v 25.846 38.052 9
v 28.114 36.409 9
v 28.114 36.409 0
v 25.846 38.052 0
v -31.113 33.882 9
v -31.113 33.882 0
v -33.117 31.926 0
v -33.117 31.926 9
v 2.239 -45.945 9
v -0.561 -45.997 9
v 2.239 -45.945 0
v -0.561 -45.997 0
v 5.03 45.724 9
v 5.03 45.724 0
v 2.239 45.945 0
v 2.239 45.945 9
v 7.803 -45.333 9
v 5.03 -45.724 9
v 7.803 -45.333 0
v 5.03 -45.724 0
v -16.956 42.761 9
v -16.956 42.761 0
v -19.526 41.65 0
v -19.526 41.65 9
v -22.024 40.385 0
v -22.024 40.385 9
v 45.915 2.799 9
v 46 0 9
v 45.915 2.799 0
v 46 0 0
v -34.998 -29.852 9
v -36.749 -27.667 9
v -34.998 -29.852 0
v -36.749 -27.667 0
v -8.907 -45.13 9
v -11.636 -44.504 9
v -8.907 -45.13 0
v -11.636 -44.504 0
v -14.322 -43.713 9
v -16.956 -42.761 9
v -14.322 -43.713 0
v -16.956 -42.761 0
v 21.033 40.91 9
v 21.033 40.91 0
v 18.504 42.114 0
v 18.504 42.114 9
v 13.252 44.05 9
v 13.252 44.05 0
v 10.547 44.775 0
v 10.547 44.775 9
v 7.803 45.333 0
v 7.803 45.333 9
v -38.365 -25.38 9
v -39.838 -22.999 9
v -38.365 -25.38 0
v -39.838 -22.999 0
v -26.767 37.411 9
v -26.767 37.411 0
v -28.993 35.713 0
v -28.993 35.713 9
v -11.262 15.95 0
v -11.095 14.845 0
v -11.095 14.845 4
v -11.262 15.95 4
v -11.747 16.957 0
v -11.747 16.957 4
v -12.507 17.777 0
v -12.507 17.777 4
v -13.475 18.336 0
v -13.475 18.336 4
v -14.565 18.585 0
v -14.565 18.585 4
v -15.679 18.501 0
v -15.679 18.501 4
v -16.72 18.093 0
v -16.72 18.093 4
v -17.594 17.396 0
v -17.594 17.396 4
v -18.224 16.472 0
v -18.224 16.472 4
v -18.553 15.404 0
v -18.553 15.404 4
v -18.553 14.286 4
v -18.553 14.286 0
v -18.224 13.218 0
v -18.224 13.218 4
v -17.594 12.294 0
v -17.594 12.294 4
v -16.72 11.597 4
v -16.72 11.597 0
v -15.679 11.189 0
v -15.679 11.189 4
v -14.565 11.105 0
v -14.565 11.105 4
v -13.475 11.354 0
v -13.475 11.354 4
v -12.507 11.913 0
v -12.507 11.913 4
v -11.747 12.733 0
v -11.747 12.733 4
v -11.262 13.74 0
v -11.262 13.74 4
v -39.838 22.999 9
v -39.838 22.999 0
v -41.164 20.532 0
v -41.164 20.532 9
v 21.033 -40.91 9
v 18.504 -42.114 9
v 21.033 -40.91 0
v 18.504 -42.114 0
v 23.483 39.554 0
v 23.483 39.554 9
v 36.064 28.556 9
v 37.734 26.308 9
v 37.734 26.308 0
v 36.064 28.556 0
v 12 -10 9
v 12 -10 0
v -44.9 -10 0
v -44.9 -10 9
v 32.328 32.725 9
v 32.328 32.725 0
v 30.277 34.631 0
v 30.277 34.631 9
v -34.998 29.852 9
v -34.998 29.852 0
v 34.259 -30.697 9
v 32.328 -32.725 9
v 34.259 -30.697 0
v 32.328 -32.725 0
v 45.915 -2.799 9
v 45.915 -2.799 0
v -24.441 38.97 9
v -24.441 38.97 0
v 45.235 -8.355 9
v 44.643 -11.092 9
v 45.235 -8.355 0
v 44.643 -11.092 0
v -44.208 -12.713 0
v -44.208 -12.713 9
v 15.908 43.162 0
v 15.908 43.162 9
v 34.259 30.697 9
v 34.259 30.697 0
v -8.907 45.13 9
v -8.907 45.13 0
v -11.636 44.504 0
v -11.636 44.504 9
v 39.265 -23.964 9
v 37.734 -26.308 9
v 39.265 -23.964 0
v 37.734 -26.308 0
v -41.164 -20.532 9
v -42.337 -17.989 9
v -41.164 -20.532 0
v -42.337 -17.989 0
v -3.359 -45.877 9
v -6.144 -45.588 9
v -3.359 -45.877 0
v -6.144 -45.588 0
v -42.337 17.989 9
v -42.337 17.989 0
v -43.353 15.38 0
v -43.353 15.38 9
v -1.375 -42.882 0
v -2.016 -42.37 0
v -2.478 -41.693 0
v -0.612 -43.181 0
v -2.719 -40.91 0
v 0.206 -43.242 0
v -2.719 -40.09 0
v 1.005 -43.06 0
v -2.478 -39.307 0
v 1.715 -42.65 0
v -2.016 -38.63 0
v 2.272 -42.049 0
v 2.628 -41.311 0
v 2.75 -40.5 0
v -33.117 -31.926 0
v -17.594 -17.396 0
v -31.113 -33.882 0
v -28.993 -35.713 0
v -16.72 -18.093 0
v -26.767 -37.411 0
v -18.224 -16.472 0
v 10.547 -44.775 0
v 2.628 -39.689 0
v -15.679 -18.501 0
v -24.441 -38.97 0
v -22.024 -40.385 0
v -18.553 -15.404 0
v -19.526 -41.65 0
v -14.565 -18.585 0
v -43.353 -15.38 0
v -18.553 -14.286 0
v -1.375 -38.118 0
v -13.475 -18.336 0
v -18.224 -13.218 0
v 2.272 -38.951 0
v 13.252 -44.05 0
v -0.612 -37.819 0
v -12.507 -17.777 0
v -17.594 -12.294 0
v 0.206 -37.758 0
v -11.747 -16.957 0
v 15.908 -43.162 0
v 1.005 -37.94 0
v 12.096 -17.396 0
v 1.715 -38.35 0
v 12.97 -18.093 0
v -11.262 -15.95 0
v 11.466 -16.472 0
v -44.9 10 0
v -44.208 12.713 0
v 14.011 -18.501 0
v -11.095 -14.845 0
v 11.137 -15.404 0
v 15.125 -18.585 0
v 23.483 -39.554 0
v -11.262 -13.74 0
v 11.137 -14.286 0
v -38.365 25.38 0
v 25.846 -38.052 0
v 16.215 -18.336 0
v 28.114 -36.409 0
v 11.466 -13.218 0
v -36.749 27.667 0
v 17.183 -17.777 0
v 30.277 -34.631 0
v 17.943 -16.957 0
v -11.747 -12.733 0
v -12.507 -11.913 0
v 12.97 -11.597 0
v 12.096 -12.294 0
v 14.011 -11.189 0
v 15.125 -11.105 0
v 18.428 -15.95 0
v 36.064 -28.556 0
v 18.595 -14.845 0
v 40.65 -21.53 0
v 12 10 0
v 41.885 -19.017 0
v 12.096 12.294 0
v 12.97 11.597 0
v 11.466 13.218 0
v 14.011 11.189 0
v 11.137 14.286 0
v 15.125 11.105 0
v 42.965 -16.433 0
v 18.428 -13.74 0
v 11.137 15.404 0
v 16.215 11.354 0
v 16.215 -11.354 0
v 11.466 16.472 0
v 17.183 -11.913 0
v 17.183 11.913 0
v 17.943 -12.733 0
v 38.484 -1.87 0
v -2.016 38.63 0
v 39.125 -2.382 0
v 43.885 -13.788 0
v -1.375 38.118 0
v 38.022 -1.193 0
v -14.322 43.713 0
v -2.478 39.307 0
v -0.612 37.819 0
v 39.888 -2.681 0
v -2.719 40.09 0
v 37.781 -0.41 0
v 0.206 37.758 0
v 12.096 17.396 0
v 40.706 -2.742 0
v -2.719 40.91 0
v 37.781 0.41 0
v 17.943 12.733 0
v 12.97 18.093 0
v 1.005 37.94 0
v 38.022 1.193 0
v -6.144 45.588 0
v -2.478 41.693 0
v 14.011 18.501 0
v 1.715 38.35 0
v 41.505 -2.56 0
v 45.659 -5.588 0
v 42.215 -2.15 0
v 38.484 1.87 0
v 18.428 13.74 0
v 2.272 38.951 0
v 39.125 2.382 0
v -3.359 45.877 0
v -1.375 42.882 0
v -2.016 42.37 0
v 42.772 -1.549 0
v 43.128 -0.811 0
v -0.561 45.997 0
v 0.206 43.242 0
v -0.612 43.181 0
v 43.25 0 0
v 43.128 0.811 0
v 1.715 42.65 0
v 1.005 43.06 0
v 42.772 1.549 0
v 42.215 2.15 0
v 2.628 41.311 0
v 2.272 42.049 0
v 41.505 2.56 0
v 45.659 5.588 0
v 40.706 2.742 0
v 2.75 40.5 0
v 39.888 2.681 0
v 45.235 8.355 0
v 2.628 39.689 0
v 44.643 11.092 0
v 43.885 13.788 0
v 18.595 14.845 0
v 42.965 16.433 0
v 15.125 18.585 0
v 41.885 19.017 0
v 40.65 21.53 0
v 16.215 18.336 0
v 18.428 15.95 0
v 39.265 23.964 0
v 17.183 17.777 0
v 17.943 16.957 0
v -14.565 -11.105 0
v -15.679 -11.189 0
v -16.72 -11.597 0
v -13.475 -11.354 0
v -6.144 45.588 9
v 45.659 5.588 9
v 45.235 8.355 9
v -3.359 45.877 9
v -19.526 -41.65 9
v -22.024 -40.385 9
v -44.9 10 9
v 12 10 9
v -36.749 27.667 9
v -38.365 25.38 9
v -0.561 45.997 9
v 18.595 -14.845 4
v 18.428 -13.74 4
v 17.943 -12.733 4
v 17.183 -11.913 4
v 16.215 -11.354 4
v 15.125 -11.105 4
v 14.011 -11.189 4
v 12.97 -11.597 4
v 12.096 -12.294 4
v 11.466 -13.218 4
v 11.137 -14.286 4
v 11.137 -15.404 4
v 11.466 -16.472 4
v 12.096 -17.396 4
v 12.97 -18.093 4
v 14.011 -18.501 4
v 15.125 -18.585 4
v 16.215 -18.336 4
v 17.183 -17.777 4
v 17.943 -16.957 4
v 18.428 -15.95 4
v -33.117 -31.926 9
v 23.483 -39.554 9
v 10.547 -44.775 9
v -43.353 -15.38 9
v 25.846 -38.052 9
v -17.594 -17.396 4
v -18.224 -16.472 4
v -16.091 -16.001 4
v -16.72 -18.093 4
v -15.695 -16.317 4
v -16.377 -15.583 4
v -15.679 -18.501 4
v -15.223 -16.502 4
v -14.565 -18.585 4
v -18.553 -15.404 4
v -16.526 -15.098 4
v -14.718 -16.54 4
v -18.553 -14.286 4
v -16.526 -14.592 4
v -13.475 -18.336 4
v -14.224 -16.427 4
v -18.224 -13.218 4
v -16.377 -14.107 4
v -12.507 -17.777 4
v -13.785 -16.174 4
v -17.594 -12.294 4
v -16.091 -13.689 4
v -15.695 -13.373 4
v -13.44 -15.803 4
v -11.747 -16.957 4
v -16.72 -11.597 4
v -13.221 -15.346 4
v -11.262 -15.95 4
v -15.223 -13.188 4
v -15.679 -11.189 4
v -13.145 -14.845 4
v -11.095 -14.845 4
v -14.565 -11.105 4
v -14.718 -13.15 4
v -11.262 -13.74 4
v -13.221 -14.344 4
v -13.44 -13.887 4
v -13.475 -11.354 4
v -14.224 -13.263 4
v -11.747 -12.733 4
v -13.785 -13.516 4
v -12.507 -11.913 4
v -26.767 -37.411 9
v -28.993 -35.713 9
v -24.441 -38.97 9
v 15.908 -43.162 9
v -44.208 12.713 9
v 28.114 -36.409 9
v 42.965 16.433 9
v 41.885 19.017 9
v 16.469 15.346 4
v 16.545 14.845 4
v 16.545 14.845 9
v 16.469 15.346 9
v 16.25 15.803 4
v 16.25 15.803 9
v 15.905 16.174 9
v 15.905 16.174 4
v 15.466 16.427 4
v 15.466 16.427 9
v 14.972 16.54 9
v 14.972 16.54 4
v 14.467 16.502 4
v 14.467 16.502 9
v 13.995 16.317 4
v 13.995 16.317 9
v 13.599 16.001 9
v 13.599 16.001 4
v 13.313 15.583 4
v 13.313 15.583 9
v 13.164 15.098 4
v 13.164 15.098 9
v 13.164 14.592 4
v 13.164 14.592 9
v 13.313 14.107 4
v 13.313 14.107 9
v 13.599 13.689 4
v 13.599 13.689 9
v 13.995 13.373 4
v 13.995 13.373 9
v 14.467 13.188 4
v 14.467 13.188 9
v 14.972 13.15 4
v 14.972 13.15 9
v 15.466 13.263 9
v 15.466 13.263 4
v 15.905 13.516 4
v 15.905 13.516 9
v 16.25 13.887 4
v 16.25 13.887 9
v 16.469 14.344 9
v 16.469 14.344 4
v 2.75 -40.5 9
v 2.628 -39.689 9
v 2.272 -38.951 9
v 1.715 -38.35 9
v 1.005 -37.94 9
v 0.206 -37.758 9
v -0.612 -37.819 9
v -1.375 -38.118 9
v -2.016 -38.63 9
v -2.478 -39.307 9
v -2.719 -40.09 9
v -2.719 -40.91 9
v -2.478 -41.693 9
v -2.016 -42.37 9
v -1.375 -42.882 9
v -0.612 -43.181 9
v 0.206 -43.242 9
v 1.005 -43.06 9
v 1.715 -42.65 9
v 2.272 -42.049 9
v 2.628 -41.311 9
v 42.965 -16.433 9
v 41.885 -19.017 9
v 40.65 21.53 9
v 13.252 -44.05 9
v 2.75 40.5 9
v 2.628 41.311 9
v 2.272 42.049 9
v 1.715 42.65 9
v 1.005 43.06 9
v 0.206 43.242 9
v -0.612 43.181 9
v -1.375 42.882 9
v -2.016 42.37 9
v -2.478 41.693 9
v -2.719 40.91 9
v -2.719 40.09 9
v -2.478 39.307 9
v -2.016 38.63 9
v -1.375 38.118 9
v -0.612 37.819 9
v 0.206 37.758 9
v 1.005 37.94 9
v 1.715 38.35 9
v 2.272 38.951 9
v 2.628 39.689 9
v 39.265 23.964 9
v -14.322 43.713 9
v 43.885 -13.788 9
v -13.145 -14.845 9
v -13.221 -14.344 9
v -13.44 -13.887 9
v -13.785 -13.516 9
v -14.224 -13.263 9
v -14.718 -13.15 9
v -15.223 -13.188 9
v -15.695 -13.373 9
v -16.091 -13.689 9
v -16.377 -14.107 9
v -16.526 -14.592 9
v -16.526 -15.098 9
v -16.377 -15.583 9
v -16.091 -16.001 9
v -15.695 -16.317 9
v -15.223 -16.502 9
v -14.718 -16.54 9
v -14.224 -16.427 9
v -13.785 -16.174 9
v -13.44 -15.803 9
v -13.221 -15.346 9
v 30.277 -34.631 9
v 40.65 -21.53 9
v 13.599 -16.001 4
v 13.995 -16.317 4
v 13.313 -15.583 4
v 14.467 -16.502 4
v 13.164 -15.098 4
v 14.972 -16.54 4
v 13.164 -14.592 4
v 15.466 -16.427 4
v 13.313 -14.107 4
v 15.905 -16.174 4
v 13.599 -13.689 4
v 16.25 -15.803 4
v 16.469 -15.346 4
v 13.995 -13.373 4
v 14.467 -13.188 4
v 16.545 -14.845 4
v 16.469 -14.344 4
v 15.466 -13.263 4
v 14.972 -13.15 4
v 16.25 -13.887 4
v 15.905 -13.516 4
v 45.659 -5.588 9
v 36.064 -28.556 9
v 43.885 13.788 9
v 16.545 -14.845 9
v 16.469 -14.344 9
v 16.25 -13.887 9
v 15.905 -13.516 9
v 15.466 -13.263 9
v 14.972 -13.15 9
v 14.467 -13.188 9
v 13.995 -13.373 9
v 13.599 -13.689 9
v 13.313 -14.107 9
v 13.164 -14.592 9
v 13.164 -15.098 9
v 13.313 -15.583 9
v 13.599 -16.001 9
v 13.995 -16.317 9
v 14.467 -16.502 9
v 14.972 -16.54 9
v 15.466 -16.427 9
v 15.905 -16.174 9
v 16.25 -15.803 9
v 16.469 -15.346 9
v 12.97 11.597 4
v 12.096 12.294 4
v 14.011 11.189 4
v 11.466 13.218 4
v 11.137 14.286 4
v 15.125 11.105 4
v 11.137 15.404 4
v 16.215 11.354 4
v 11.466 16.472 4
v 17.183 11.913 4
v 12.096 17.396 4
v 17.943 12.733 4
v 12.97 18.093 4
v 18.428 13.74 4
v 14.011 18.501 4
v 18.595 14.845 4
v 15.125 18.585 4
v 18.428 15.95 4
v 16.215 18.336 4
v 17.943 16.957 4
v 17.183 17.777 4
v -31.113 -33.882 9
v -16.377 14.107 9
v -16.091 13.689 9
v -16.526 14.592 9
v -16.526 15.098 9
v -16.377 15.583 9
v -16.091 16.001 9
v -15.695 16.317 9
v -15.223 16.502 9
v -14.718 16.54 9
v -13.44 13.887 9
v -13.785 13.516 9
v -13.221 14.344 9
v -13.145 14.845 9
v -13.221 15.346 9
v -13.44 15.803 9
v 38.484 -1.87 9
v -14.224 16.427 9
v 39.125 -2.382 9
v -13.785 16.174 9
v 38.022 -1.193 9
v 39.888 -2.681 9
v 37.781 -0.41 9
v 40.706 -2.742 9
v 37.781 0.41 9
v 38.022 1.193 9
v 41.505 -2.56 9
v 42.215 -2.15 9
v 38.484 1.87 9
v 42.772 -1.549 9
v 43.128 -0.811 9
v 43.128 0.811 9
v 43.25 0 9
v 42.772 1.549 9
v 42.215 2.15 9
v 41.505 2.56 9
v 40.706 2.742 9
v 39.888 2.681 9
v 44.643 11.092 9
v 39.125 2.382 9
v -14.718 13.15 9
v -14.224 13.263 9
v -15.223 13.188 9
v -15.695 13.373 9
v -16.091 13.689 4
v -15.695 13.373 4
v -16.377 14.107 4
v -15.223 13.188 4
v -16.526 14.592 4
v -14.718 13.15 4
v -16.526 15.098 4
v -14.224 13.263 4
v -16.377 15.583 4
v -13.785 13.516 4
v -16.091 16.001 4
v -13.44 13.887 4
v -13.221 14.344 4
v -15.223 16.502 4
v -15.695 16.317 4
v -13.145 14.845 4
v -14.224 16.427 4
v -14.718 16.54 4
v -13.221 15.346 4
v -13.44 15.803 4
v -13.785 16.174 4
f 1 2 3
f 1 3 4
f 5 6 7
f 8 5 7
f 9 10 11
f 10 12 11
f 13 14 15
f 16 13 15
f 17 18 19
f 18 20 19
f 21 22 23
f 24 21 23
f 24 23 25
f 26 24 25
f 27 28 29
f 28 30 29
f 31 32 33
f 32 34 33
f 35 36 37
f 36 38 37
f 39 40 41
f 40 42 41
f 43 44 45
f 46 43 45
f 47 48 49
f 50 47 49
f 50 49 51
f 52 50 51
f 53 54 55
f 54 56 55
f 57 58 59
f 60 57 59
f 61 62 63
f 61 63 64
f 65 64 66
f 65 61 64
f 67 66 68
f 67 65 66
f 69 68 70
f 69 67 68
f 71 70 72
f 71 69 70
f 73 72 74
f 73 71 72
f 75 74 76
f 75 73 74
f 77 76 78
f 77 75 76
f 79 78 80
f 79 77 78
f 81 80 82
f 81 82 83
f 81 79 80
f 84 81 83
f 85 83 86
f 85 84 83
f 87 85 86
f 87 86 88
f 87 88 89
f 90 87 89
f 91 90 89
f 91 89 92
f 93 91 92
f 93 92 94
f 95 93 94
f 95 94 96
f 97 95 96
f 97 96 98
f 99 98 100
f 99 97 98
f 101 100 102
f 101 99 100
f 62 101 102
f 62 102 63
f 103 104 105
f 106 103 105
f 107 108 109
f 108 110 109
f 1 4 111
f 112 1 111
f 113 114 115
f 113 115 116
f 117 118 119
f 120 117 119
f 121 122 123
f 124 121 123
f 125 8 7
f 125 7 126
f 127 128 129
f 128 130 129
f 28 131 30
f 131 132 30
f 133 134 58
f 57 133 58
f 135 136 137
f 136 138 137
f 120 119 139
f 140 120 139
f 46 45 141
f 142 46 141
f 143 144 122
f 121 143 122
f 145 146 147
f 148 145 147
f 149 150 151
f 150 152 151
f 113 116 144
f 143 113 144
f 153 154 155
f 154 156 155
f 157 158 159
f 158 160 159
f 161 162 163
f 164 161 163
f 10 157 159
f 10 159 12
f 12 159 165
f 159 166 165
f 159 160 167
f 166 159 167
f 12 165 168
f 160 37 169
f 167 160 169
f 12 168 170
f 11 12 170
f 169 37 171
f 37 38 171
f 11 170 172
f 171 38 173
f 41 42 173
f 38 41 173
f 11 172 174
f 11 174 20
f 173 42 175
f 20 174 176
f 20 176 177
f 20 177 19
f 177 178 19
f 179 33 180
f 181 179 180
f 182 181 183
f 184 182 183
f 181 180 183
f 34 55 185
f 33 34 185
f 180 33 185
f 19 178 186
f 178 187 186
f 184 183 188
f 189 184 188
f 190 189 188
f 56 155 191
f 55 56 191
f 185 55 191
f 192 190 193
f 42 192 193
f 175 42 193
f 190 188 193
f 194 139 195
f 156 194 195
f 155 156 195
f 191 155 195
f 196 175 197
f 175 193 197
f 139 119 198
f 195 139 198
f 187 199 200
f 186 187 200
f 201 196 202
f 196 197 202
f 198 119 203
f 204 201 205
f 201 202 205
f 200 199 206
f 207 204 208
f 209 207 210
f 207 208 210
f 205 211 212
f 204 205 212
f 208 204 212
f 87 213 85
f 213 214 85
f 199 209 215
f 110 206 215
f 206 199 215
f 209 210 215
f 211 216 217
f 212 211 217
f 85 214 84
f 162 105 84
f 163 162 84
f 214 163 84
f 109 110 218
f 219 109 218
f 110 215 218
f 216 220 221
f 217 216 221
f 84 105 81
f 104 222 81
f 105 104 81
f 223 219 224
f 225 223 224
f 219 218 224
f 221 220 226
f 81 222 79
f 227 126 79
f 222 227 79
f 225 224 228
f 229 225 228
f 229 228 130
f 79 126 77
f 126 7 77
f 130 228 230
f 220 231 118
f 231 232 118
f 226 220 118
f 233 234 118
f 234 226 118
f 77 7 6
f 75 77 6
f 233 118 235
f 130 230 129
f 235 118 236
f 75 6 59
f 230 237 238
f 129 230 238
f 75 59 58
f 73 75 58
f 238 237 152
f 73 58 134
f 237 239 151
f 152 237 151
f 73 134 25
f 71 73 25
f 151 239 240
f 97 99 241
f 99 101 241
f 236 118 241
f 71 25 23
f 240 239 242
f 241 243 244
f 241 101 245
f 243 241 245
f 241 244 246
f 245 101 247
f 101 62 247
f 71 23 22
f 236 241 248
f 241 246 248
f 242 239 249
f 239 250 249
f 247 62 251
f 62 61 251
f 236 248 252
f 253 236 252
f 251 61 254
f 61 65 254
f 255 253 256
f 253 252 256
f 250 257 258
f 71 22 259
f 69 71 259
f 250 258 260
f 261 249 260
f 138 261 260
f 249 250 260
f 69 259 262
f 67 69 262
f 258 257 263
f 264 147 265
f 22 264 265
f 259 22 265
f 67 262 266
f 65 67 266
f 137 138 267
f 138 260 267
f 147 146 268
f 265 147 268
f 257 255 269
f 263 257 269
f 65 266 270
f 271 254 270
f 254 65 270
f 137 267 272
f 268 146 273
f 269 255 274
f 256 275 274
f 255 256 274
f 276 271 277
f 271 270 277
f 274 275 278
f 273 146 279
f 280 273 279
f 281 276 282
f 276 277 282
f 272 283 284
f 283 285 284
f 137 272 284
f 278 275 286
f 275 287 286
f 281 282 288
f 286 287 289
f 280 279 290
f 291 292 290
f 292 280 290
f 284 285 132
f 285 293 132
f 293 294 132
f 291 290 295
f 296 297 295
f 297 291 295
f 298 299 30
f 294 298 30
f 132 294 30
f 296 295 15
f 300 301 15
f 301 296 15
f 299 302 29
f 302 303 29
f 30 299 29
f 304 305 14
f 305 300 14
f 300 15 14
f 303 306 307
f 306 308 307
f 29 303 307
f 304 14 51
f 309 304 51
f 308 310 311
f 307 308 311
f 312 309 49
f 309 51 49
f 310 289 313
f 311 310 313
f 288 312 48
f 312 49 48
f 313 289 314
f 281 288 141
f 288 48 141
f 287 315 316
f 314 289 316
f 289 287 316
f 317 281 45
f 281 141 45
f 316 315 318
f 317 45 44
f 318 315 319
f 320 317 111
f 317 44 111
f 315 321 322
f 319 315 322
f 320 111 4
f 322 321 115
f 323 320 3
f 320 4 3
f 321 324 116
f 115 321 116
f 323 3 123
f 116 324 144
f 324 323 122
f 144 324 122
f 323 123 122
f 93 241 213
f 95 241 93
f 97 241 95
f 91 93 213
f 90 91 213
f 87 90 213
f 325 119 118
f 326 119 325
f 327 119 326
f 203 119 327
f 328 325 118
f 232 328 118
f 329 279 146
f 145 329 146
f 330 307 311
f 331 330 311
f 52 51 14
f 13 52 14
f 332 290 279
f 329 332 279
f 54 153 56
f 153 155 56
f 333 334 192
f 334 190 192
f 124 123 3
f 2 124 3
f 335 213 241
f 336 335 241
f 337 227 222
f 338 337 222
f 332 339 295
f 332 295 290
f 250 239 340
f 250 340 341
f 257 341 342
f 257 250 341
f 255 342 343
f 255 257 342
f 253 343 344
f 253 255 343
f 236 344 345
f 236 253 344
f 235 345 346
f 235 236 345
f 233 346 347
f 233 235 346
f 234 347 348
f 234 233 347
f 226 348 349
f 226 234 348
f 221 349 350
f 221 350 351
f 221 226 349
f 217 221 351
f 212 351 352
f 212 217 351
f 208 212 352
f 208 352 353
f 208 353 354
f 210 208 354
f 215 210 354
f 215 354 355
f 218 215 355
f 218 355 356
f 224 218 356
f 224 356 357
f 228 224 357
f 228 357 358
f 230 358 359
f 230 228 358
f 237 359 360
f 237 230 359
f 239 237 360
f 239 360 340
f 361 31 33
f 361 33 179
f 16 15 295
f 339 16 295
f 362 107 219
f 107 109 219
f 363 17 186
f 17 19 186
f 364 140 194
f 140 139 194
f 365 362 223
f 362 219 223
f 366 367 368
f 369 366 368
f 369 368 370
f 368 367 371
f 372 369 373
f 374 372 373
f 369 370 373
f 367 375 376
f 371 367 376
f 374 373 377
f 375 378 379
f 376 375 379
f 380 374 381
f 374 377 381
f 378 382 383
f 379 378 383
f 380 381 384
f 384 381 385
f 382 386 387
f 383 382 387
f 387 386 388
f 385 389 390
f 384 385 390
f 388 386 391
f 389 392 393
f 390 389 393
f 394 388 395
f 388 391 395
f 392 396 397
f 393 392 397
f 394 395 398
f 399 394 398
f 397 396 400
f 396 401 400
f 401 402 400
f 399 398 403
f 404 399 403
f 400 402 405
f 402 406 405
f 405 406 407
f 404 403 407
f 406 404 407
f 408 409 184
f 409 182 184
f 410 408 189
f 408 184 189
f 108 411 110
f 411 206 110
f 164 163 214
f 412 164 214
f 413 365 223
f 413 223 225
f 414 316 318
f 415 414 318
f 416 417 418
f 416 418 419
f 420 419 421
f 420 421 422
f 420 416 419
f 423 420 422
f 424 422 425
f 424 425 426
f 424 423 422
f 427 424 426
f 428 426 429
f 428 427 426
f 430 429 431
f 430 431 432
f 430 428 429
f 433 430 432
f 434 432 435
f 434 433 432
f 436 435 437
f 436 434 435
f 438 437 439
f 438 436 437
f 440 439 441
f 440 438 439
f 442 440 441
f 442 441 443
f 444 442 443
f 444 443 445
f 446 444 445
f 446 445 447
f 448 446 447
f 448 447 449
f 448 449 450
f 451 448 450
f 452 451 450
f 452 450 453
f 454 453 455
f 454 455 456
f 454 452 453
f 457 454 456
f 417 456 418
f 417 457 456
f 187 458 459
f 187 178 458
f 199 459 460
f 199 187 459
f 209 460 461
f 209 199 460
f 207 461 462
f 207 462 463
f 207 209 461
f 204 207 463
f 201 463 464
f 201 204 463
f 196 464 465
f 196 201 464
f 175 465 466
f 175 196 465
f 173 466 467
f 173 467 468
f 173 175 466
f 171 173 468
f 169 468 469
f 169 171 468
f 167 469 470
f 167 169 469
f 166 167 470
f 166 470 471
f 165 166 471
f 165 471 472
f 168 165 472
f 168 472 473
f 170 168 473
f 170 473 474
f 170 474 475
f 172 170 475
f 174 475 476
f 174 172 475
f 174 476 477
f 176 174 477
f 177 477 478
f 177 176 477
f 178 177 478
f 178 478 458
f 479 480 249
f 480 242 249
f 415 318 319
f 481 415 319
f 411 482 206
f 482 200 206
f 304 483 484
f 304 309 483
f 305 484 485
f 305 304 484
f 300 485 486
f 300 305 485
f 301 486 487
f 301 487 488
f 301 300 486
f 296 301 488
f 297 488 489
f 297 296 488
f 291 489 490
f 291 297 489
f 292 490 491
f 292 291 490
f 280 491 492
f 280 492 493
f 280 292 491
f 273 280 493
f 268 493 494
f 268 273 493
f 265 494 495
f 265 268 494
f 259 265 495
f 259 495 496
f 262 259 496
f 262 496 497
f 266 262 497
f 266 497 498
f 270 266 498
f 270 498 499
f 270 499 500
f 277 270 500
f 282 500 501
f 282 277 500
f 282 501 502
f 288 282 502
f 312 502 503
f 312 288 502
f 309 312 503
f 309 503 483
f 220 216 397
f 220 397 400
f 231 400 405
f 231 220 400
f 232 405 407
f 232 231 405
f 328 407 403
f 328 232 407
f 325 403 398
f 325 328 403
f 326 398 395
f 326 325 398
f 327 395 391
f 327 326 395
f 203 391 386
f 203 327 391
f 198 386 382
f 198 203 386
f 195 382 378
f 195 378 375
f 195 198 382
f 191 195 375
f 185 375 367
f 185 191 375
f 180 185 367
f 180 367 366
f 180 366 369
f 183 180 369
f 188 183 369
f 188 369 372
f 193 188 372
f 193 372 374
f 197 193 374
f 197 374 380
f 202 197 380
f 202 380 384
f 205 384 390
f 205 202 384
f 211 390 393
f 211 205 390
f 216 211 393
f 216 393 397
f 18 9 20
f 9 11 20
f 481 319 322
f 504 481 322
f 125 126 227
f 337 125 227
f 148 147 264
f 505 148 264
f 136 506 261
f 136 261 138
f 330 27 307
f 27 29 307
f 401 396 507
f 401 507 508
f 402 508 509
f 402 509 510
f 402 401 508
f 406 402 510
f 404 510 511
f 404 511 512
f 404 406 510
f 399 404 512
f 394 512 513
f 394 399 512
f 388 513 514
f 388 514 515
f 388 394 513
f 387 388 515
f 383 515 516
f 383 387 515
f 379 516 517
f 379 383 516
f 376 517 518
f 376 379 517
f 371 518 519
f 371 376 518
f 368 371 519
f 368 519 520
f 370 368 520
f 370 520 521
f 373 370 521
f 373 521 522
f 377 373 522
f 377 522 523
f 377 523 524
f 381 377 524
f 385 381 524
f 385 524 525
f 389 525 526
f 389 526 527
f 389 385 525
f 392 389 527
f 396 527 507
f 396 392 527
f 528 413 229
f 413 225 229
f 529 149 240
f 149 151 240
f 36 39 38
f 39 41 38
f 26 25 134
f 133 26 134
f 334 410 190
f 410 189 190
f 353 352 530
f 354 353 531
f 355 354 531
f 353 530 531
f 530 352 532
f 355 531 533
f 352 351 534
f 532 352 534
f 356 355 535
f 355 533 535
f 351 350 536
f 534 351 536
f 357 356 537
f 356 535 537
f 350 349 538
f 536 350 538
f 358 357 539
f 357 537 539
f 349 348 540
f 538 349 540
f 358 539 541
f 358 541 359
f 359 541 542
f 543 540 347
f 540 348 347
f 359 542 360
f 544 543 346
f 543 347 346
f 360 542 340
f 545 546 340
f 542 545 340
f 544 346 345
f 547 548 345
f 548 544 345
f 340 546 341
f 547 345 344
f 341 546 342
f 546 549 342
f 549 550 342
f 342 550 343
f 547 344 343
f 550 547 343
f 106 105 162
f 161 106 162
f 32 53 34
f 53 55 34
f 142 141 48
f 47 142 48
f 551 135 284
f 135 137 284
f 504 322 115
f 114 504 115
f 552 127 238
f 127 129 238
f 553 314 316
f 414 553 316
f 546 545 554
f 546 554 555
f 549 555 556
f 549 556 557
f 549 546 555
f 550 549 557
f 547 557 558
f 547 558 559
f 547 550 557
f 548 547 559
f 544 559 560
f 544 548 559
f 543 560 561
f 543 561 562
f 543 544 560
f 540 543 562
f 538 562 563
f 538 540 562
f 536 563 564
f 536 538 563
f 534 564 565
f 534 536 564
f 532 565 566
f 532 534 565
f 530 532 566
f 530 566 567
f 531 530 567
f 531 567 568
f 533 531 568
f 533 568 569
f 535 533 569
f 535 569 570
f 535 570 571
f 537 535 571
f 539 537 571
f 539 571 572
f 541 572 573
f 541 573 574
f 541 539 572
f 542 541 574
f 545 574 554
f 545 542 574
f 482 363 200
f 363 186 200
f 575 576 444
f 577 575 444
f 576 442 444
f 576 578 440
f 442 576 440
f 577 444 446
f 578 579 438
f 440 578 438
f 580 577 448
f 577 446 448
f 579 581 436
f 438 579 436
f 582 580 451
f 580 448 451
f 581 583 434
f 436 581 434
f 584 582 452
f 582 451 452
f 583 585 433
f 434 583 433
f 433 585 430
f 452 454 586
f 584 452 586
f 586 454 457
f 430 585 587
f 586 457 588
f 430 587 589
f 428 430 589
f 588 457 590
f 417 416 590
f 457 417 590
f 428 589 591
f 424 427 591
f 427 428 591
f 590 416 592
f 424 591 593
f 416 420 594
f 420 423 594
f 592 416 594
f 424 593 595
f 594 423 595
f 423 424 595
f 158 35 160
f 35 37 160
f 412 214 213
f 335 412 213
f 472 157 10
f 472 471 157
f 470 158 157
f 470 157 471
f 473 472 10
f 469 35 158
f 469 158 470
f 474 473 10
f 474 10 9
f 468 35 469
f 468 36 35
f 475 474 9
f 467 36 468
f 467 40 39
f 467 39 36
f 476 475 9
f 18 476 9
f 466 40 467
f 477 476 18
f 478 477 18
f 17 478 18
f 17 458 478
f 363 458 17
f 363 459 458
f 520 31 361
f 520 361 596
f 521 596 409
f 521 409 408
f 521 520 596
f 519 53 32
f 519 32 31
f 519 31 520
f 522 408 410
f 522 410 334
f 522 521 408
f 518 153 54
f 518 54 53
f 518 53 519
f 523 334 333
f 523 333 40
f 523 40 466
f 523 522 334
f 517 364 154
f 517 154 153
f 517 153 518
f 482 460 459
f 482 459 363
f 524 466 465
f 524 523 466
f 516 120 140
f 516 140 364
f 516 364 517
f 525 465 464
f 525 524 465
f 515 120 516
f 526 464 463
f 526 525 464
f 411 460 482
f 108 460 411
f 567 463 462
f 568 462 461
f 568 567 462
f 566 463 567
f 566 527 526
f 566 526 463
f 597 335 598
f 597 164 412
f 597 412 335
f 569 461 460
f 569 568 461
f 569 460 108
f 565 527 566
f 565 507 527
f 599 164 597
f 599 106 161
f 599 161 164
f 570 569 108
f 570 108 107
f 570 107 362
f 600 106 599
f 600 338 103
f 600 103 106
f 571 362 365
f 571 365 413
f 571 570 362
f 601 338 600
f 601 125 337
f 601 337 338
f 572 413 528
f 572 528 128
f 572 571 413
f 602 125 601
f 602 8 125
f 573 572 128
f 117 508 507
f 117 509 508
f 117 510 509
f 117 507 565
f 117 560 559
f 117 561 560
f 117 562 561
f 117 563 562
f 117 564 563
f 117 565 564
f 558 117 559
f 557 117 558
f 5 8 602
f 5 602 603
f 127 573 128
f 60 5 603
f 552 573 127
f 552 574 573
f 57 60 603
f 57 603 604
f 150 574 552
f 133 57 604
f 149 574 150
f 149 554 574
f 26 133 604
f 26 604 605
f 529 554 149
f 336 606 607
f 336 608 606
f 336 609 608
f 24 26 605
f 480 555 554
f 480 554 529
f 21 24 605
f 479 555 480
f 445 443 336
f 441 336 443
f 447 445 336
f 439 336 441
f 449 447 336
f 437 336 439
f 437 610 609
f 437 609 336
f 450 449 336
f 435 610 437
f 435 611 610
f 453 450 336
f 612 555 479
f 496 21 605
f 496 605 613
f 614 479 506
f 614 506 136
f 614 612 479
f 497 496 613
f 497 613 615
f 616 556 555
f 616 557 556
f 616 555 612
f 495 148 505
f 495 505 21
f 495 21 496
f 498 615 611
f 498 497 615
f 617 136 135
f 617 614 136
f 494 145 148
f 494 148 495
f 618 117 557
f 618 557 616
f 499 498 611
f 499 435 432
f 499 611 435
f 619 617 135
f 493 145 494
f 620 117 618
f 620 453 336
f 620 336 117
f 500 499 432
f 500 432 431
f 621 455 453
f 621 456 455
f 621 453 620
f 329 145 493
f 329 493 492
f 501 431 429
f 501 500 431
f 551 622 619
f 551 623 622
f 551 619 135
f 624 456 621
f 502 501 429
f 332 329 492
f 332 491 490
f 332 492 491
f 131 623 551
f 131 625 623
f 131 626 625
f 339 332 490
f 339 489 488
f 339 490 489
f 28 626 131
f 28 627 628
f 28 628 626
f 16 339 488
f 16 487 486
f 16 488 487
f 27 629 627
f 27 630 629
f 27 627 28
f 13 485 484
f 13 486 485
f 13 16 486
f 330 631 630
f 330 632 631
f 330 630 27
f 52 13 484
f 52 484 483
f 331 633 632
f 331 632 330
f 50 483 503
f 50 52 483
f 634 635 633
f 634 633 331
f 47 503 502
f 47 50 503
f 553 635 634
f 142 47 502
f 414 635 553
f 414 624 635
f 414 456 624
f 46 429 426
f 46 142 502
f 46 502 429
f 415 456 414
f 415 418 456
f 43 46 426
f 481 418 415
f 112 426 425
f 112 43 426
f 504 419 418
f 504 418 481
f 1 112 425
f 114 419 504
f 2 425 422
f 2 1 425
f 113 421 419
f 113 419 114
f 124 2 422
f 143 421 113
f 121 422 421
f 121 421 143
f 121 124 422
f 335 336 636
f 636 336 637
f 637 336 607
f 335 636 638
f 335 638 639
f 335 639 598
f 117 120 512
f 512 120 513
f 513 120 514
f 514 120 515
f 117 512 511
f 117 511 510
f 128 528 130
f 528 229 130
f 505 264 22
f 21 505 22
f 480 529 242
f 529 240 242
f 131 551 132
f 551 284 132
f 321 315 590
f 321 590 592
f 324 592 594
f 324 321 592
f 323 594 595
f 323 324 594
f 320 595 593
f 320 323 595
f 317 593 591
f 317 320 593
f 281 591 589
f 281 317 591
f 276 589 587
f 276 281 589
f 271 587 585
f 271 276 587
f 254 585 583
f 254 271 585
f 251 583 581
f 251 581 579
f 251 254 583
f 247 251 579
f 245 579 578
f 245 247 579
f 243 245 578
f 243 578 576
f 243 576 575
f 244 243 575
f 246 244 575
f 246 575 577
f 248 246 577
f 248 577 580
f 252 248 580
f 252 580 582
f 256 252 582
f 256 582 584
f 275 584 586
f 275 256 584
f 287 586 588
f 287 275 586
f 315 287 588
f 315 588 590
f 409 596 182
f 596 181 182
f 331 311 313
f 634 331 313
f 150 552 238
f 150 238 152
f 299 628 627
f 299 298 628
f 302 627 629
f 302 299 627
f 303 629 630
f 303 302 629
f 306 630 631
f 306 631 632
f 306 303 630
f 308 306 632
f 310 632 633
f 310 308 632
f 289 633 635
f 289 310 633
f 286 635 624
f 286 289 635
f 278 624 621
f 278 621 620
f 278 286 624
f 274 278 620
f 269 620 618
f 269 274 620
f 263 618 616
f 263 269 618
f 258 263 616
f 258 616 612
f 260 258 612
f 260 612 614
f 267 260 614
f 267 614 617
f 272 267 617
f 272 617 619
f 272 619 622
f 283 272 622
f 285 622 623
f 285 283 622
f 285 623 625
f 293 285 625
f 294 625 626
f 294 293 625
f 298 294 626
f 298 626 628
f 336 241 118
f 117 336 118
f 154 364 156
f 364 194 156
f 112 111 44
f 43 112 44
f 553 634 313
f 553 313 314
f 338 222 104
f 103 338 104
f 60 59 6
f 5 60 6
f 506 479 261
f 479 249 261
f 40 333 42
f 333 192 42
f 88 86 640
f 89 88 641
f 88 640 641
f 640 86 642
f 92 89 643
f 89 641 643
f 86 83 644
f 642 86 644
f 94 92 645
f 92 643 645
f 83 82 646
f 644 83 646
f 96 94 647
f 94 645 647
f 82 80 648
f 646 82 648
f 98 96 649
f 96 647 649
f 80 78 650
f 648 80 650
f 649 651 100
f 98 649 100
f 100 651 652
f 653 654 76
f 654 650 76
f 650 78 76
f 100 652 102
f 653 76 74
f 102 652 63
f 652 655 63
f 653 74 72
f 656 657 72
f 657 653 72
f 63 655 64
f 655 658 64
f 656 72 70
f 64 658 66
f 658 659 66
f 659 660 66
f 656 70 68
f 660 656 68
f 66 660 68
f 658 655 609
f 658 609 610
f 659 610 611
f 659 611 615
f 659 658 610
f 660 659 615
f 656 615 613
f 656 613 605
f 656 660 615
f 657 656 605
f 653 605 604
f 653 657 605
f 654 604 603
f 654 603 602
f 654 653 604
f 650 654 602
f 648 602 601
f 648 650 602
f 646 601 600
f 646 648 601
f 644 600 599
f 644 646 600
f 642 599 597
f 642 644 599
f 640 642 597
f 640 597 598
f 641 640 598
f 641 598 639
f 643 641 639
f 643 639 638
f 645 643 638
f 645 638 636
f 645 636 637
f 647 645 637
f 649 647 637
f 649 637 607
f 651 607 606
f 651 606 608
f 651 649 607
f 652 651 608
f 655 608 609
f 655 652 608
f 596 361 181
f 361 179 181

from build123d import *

# Parameters (mm, degrees)
SKETCH_1_R        = 3.75
SKETCH_1_R_2      = 2.75
EXTRUDE_422_DEPTH = 4
EXTRUDE_START     = 4
SKETCH_2_R        = 1.7
SKETCH_2_R_2      = 2.75
EXTRUDE_698_DEPTH = 5


with BuildPart() as part:
    # 草图1 → Extrude 422 (new body)
    with BuildSketch(Plane.XY):
        Polygon((-44.899888641, -10), (-44.2082264, -12.713485699), (-43.352738806, -15.379858192), (-42.336596099, -17.989236526), (-41.163563864, -20.531950955), (-39.837989085, -22.998578775), (-38.364784033, -25.379979238), (-36.74940806, -27.667327432), (-34.997847373, -29.852146979), (-33.116592846, -31.926341448), (-31.112615968, -33.882224361), (-28.993343009, -35.712547671), (-26.7666275, -37.410528629), (-24.440721127, -38.969874914), (-22.024243155, -40.384807953), (-19.526148488, -41.650084336), (-16.955694479, -42.761015244), (-14.322406631, -43.713483827), (-11.636043292, -44.503960459), (-8.906559497, -45.129515818), (-6.144070075, -45.587831742), (-3.358812166, -45.87720982), (-0.561107284, -45.996577684), (2.238676931, -45.945492985), (5.030165132, -45.72414503), (7.803012717, -45.333354084), (10.546944161, -44.774568327), (13.251791096, -44.049858487), (15.907529991, -43.161910171), (18.504319299, -42.114013906), (21.032535927, -40.910052952), (23.482810893, -39.554488905), (25.846064052, -38.052345171), (28.11353774, -36.409188342), (30.276829231, -34.631107573), (32.327921871, -32.724692016), (34.25921479, -30.697006401), (36.063551069, -28.555564857), (37.734244259, -26.308303066), (39.265103162, -23.963548854), (40.650454772, -21.529991333), (41.885165301, -19.016648698), (42.9646592, -16.432834808), (43.884936117, -13.788124675), (44.64258572, -11.092318975), (45.234800338, -8.355407734), (45.659385361, -5.587533306), (45.914767377, -2.798952785), (46, 0), (45.914767377, 2.798952785), (45.659385361, 5.587533306), (45.234800338, 8.355407734), (44.64258572, 11.092318975), (43.884936117, 13.788124675), (42.9646592, 16.432834808), (41.885165301, 19.016648698), (40.650454772, 21.529991333), (39.265103162, 23.963548854), (37.734244259, 26.308303066), (36.063551069, 28.555564857), (34.25921479, 30.697006401), (32.327921871, 32.724692016), (30.276829231, 34.631107573), (28.11353774, 36.409188342), (25.846064052, 38.052345171), (23.482810893, 39.554488905), (21.032535927, 40.910052952), (18.504319299, 42.114013906), (15.907529991, 43.161910171), (13.251791096, 44.049858487), (10.546944161, 44.774568327), (7.803012717, 45.333354084), (5.030165132, 45.72414503), (2.238676931, 45.945492985), (-0.561107284, 45.996577684), (-3.358812166, 45.87720982), (-6.144070075, 45.587831742), (-8.906559497, 45.129515818), (-11.636043292, 44.503960459), (-14.322406631, 43.713483827), (-16.955694479, 42.761015244), (-19.526148488, 41.650084336), (-22.024243155, 40.384807953), (-24.440721127, 38.969874914), (-26.7666275, 37.410528629), (-28.993343009, 35.712547671), (-31.112615968, 33.882224361), (-33.116592846, 31.926341448), (-34.997847373, 29.852146979), (-36.74940806, 27.667327432), (-38.364784033, 25.379979238), (-39.837989085, 22.998578775), (-41.163563864, 20.531950955), (-42.336596099, 17.989236526), (-43.352738806, 15.379858192), (-44.2082264, 12.713485699), (-44.899888641, 10), (12, 10), (12, -10), align=None)
        with Locations((-14.845, -14.845)):
            Circle(SKETCH_1_R, mode=Mode.SUBTRACT)
        with Locations((-14.845, 14.845)):
            Circle(SKETCH_1_R, mode=Mode.SUBTRACT)
        with Locations((14.845, -14.845)):
            Circle(SKETCH_1_R, mode=Mode.SUBTRACT)
        with Locations((14.845, 14.845)):
            Circle(SKETCH_1_R, mode=Mode.SUBTRACT)
        with Locations((0, -40.5)):
            Circle(SKETCH_1_R_2, mode=Mode.SUBTRACT)
        with Locations((0, 40.5)):
            Circle(SKETCH_1_R_2, mode=Mode.SUBTRACT)
        with Locations((40.5, 0)):
            Circle(SKETCH_1_R_2, mode=Mode.SUBTRACT)
    extrude(amount=EXTRUDE_422_DEPTH)

    # 草图2 → Extrude 698 (add)
    with BuildSketch(Plane.XY.offset(EXTRUDE_START)):
        Polygon((-44.899888641, -10), (-44.2082264, -12.713485699), (-43.352738806, -15.379858192), (-42.336596099, -17.989236526), (-41.163563864, -20.531950955), (-39.837989085, -22.998578775), (-38.364784033, -25.379979238), (-36.74940806, -27.667327432), (-34.997847373, -29.852146979), (-33.116592846, -31.926341448), (-31.112615968, -33.882224361), (-28.993343009, -35.712547671), (-26.7666275, -37.410528629), (-24.440721127, -38.969874914), (-22.024243155, -40.384807953), (-19.526148488, -41.650084336), (-16.955694479, -42.761015244), (-14.322406631, -43.713483827), (-11.636043292, -44.503960459), (-8.906559497, -45.129515818), (-6.144070075, -45.587831742), (-3.358812166, -45.87720982), (-0.561107284, -45.996577684), (2.238676931, -45.945492985), (5.030165132, -45.72414503), (7.803012717, -45.333354084), (10.546944161, -44.774568327), (13.251791096, -44.049858487), (15.907529991, -43.161910171), (18.504319299, -42.114013906), (21.032535927, -40.910052952), (23.482810893, -39.554488905), (25.846064052, -38.052345171), (28.11353774, -36.409188342), (30.276829231, -34.631107573), (32.327921871, -32.724692016), (34.25921479, -30.697006401), (36.063551069, -28.555564857), (37.734244259, -26.308303066), (39.265103162, -23.963548854), (40.650454772, -21.529991333), (41.885165301, -19.016648698), (42.9646592, -16.432834808), (43.884936117, -13.788124675), (44.64258572, -11.092318975), (45.234800338, -8.355407734), (45.659385361, -5.587533306), (45.914767377, -2.798952785), (46, 0), (45.914767377, 2.798952785), (45.659385361, 5.587533306), (45.234800338, 8.355407734), (44.64258572, 11.092318975), (43.884936117, 13.788124675), (42.9646592, 16.432834808), (41.885165301, 19.016648698), (40.650454772, 21.529991333), (39.265103162, 23.963548854), (37.734244259, 26.308303066), (36.063551069, 28.555564857), (34.25921479, 30.697006401), (32.327921871, 32.724692016), (30.276829231, 34.631107573), (28.11353774, 36.409188342), (25.846064052, 38.052345171), (23.482810893, 39.554488905), (21.032535927, 40.910052952), (18.504319299, 42.114013906), (15.907529991, 43.161910171), (13.251791096, 44.049858487), (10.546944161, 44.774568327), (7.803012717, 45.333354084), (5.030165132, 45.72414503), (2.238676931, 45.945492985), (-0.561107284, 45.996577684), (-3.358812166, 45.87720982), (-6.144070075, 45.587831742), (-8.906559497, 45.129515818), (-11.636043292, 44.503960459), (-14.322406631, 43.713483827), (-16.955694479, 42.761015244), (-19.526148488, 41.650084336), (-22.024243155, 40.384807953), (-24.440721127, 38.969874914), (-26.7666275, 37.410528629), (-28.993343009, 35.712547671), (-31.112615968, 33.882224361), (-33.116592846, 31.926341448), (-34.997847373, 29.852146979), (-36.74940806, 27.667327432), (-38.364784033, 25.379979238), (-39.837989085, 22.998578775), (-41.163563864, 20.531950955), (-42.336596099, 17.989236526), (-43.352738806, 15.379858192), (-44.2082264, 12.713485699), (-44.899888641, 10), (12, 10), (12, -10), align=None)
        with Locations((-14.845, -14.845)):
            Circle(SKETCH_2_R, mode=Mode.SUBTRACT)
        with Locations((-14.845, 14.845)):
            Circle(SKETCH_2_R, mode=Mode.SUBTRACT)
        with Locations((14.845, -14.845)):
            Circle(SKETCH_2_R, mode=Mode.SUBTRACT)
        with Locations((14.845, 14.845)):
            Circle(SKETCH_2_R, mode=Mode.SUBTRACT)
        with Locations((0, -40.5)):
            Circle(SKETCH_2_R_2, mode=Mode.SUBTRACT)
        with Locations((0, 40.5)):
            Circle(SKETCH_2_R_2, mode=Mode.SUBTRACT)
        with Locations((40.5, 0)):
            Circle(SKETCH_2_R_2, mode=Mode.SUBTRACT)
    extrude(amount=EXTRUDE_698_DEPTH)


solid = part.part
